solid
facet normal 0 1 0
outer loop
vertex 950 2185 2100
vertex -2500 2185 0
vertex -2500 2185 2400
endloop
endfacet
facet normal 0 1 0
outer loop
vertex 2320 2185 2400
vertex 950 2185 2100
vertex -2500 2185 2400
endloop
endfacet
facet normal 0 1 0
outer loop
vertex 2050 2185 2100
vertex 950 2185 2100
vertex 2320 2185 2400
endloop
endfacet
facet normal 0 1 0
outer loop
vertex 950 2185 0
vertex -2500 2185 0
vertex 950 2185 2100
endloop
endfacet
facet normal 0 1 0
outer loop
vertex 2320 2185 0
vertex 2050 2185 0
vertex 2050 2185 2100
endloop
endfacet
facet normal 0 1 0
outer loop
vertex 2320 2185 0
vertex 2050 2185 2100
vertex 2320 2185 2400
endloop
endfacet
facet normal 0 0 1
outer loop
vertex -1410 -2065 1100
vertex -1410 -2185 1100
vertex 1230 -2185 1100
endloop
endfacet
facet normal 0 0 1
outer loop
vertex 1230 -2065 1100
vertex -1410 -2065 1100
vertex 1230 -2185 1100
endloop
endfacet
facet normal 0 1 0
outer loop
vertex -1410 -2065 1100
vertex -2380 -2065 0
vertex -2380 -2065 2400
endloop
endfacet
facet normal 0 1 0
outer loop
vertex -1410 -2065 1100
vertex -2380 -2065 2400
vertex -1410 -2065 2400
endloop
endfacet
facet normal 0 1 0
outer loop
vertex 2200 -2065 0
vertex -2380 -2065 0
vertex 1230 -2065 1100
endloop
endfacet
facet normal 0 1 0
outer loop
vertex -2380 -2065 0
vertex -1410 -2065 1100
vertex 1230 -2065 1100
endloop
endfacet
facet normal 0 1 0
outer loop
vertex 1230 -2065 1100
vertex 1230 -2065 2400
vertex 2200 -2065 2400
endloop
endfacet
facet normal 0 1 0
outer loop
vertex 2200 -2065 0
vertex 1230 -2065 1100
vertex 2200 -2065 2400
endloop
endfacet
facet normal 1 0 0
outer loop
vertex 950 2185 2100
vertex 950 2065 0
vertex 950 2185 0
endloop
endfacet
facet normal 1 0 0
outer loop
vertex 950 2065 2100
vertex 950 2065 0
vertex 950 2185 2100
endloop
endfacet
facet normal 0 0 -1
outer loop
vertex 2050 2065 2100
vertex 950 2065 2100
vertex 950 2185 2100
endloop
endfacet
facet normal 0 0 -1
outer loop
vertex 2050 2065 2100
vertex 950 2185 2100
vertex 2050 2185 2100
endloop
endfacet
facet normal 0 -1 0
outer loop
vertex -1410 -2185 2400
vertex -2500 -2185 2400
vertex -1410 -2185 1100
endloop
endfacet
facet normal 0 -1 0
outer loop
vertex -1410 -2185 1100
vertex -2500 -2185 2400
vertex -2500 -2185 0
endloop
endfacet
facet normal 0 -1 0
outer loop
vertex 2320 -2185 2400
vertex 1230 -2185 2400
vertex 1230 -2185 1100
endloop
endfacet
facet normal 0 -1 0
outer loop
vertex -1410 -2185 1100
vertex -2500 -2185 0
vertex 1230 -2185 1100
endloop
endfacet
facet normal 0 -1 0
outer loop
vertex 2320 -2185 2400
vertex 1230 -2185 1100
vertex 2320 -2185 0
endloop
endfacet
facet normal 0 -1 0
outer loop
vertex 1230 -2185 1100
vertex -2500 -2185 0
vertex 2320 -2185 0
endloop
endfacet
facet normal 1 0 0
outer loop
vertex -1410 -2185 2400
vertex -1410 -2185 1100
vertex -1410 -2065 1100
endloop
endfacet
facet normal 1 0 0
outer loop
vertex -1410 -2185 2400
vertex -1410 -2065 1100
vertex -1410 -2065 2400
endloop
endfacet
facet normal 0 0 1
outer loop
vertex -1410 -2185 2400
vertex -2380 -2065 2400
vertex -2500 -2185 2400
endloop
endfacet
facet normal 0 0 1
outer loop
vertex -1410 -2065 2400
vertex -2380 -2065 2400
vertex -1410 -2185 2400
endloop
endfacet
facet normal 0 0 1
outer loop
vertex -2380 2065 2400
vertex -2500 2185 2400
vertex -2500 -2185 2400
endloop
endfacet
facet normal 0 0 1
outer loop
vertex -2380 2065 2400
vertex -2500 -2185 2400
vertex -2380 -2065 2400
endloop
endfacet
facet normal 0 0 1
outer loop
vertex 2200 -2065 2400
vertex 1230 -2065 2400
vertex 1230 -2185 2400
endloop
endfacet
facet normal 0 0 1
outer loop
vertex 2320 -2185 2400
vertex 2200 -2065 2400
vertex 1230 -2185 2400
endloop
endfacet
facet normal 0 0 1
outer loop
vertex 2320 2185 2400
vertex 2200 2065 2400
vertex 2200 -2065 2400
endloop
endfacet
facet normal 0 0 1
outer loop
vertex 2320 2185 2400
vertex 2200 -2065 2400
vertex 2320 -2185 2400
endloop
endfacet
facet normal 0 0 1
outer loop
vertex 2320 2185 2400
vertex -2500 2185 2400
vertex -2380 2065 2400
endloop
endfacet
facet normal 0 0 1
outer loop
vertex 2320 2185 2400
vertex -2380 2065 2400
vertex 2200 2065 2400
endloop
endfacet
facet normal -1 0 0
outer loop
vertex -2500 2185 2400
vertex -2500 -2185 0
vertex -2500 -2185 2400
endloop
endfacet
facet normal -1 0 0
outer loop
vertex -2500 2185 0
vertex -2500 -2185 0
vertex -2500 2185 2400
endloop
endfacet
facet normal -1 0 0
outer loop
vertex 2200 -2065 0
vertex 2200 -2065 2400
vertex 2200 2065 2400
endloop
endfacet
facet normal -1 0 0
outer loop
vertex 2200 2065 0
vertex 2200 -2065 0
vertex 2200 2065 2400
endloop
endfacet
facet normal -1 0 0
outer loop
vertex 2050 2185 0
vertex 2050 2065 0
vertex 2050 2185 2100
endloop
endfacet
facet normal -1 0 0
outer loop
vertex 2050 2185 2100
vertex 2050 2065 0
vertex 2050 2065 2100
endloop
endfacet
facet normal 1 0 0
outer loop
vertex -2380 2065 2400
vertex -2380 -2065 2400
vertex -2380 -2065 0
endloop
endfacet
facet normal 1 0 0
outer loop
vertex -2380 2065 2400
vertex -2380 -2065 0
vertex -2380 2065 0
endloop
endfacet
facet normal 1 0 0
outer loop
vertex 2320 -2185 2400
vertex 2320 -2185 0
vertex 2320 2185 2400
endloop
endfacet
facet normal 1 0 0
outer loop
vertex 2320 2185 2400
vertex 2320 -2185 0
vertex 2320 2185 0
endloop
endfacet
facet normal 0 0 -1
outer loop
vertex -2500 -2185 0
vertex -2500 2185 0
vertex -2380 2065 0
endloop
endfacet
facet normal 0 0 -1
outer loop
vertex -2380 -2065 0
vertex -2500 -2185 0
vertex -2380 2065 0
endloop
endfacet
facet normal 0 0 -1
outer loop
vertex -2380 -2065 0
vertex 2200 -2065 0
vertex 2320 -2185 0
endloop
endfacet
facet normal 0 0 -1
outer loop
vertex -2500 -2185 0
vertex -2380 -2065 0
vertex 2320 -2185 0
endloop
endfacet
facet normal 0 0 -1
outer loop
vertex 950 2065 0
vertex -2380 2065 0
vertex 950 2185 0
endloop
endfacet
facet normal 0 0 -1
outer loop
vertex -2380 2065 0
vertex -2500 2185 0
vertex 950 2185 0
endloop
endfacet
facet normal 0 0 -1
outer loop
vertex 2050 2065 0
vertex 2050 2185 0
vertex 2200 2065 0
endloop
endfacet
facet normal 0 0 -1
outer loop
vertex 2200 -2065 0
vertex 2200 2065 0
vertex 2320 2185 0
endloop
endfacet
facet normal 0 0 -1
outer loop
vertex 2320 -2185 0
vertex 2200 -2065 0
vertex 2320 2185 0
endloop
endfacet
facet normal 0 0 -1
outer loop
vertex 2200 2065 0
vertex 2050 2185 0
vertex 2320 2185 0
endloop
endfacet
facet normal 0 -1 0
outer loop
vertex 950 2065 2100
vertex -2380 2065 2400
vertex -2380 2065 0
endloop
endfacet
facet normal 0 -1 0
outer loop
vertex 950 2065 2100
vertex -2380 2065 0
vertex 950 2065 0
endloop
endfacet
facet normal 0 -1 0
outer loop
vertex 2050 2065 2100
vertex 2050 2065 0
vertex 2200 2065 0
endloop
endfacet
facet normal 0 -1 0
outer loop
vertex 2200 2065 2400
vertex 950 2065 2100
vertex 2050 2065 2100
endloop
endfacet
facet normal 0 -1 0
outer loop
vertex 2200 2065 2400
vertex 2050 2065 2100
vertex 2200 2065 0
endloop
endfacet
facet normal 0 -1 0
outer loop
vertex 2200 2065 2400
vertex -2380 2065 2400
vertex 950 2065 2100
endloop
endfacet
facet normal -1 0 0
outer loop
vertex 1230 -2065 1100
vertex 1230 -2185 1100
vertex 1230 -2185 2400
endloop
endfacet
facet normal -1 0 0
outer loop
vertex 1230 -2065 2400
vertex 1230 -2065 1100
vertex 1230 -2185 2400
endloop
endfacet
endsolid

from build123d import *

# Parameters (mm, degrees)
F0_W     = 4820
F0_H     = 4370
F1_DEPTH = 2400
F2_W     = 4580
F2_H     = 4130
F3_DEPTH = 2400
F4_W     = 2640
F4_H     = 1300
F5_DEPTH = 120
F6_W     = 1100
F6_H     = 2100
F7_DEPTH = 120


with BuildPart() as f1:
    # F0 (on Top) → F1 (new body)
    with BuildSketch(Plane.XY):
        with Locations((-90, 0)):
            Rectangle(F0_W, F0_H)
    extrude(amount=F1_DEPTH)

    # F2 (on face) → F3 (cut, through all)
    with BuildSketch(Plane.XY.offset(2400)):
        with Locations((-90, 0)):
            Rectangle(F2_W, F2_H)
    extrude(amount=-F3_DEPTH, mode=Mode.SUBTRACT)

    # F4 (on face) → F5 (cut, through all)
    with BuildSketch(Plane.XZ.offset(2185)):
        with Locations((-90, 1750)):
            Rectangle(F4_W, F4_H)
    extrude(amount=-F5_DEPTH, mode=Mode.SUBTRACT)

    # F6 (on face) → F7 (cut, through all)
    with BuildSketch(Plane.XZ.offset(-2065)):
        with Locations((1500, 1050)):
            Rectangle(F6_W, F6_H)
    extrude(amount=-F7_DEPTH, mode=Mode.SUBTRACT)


solid = f1.part
